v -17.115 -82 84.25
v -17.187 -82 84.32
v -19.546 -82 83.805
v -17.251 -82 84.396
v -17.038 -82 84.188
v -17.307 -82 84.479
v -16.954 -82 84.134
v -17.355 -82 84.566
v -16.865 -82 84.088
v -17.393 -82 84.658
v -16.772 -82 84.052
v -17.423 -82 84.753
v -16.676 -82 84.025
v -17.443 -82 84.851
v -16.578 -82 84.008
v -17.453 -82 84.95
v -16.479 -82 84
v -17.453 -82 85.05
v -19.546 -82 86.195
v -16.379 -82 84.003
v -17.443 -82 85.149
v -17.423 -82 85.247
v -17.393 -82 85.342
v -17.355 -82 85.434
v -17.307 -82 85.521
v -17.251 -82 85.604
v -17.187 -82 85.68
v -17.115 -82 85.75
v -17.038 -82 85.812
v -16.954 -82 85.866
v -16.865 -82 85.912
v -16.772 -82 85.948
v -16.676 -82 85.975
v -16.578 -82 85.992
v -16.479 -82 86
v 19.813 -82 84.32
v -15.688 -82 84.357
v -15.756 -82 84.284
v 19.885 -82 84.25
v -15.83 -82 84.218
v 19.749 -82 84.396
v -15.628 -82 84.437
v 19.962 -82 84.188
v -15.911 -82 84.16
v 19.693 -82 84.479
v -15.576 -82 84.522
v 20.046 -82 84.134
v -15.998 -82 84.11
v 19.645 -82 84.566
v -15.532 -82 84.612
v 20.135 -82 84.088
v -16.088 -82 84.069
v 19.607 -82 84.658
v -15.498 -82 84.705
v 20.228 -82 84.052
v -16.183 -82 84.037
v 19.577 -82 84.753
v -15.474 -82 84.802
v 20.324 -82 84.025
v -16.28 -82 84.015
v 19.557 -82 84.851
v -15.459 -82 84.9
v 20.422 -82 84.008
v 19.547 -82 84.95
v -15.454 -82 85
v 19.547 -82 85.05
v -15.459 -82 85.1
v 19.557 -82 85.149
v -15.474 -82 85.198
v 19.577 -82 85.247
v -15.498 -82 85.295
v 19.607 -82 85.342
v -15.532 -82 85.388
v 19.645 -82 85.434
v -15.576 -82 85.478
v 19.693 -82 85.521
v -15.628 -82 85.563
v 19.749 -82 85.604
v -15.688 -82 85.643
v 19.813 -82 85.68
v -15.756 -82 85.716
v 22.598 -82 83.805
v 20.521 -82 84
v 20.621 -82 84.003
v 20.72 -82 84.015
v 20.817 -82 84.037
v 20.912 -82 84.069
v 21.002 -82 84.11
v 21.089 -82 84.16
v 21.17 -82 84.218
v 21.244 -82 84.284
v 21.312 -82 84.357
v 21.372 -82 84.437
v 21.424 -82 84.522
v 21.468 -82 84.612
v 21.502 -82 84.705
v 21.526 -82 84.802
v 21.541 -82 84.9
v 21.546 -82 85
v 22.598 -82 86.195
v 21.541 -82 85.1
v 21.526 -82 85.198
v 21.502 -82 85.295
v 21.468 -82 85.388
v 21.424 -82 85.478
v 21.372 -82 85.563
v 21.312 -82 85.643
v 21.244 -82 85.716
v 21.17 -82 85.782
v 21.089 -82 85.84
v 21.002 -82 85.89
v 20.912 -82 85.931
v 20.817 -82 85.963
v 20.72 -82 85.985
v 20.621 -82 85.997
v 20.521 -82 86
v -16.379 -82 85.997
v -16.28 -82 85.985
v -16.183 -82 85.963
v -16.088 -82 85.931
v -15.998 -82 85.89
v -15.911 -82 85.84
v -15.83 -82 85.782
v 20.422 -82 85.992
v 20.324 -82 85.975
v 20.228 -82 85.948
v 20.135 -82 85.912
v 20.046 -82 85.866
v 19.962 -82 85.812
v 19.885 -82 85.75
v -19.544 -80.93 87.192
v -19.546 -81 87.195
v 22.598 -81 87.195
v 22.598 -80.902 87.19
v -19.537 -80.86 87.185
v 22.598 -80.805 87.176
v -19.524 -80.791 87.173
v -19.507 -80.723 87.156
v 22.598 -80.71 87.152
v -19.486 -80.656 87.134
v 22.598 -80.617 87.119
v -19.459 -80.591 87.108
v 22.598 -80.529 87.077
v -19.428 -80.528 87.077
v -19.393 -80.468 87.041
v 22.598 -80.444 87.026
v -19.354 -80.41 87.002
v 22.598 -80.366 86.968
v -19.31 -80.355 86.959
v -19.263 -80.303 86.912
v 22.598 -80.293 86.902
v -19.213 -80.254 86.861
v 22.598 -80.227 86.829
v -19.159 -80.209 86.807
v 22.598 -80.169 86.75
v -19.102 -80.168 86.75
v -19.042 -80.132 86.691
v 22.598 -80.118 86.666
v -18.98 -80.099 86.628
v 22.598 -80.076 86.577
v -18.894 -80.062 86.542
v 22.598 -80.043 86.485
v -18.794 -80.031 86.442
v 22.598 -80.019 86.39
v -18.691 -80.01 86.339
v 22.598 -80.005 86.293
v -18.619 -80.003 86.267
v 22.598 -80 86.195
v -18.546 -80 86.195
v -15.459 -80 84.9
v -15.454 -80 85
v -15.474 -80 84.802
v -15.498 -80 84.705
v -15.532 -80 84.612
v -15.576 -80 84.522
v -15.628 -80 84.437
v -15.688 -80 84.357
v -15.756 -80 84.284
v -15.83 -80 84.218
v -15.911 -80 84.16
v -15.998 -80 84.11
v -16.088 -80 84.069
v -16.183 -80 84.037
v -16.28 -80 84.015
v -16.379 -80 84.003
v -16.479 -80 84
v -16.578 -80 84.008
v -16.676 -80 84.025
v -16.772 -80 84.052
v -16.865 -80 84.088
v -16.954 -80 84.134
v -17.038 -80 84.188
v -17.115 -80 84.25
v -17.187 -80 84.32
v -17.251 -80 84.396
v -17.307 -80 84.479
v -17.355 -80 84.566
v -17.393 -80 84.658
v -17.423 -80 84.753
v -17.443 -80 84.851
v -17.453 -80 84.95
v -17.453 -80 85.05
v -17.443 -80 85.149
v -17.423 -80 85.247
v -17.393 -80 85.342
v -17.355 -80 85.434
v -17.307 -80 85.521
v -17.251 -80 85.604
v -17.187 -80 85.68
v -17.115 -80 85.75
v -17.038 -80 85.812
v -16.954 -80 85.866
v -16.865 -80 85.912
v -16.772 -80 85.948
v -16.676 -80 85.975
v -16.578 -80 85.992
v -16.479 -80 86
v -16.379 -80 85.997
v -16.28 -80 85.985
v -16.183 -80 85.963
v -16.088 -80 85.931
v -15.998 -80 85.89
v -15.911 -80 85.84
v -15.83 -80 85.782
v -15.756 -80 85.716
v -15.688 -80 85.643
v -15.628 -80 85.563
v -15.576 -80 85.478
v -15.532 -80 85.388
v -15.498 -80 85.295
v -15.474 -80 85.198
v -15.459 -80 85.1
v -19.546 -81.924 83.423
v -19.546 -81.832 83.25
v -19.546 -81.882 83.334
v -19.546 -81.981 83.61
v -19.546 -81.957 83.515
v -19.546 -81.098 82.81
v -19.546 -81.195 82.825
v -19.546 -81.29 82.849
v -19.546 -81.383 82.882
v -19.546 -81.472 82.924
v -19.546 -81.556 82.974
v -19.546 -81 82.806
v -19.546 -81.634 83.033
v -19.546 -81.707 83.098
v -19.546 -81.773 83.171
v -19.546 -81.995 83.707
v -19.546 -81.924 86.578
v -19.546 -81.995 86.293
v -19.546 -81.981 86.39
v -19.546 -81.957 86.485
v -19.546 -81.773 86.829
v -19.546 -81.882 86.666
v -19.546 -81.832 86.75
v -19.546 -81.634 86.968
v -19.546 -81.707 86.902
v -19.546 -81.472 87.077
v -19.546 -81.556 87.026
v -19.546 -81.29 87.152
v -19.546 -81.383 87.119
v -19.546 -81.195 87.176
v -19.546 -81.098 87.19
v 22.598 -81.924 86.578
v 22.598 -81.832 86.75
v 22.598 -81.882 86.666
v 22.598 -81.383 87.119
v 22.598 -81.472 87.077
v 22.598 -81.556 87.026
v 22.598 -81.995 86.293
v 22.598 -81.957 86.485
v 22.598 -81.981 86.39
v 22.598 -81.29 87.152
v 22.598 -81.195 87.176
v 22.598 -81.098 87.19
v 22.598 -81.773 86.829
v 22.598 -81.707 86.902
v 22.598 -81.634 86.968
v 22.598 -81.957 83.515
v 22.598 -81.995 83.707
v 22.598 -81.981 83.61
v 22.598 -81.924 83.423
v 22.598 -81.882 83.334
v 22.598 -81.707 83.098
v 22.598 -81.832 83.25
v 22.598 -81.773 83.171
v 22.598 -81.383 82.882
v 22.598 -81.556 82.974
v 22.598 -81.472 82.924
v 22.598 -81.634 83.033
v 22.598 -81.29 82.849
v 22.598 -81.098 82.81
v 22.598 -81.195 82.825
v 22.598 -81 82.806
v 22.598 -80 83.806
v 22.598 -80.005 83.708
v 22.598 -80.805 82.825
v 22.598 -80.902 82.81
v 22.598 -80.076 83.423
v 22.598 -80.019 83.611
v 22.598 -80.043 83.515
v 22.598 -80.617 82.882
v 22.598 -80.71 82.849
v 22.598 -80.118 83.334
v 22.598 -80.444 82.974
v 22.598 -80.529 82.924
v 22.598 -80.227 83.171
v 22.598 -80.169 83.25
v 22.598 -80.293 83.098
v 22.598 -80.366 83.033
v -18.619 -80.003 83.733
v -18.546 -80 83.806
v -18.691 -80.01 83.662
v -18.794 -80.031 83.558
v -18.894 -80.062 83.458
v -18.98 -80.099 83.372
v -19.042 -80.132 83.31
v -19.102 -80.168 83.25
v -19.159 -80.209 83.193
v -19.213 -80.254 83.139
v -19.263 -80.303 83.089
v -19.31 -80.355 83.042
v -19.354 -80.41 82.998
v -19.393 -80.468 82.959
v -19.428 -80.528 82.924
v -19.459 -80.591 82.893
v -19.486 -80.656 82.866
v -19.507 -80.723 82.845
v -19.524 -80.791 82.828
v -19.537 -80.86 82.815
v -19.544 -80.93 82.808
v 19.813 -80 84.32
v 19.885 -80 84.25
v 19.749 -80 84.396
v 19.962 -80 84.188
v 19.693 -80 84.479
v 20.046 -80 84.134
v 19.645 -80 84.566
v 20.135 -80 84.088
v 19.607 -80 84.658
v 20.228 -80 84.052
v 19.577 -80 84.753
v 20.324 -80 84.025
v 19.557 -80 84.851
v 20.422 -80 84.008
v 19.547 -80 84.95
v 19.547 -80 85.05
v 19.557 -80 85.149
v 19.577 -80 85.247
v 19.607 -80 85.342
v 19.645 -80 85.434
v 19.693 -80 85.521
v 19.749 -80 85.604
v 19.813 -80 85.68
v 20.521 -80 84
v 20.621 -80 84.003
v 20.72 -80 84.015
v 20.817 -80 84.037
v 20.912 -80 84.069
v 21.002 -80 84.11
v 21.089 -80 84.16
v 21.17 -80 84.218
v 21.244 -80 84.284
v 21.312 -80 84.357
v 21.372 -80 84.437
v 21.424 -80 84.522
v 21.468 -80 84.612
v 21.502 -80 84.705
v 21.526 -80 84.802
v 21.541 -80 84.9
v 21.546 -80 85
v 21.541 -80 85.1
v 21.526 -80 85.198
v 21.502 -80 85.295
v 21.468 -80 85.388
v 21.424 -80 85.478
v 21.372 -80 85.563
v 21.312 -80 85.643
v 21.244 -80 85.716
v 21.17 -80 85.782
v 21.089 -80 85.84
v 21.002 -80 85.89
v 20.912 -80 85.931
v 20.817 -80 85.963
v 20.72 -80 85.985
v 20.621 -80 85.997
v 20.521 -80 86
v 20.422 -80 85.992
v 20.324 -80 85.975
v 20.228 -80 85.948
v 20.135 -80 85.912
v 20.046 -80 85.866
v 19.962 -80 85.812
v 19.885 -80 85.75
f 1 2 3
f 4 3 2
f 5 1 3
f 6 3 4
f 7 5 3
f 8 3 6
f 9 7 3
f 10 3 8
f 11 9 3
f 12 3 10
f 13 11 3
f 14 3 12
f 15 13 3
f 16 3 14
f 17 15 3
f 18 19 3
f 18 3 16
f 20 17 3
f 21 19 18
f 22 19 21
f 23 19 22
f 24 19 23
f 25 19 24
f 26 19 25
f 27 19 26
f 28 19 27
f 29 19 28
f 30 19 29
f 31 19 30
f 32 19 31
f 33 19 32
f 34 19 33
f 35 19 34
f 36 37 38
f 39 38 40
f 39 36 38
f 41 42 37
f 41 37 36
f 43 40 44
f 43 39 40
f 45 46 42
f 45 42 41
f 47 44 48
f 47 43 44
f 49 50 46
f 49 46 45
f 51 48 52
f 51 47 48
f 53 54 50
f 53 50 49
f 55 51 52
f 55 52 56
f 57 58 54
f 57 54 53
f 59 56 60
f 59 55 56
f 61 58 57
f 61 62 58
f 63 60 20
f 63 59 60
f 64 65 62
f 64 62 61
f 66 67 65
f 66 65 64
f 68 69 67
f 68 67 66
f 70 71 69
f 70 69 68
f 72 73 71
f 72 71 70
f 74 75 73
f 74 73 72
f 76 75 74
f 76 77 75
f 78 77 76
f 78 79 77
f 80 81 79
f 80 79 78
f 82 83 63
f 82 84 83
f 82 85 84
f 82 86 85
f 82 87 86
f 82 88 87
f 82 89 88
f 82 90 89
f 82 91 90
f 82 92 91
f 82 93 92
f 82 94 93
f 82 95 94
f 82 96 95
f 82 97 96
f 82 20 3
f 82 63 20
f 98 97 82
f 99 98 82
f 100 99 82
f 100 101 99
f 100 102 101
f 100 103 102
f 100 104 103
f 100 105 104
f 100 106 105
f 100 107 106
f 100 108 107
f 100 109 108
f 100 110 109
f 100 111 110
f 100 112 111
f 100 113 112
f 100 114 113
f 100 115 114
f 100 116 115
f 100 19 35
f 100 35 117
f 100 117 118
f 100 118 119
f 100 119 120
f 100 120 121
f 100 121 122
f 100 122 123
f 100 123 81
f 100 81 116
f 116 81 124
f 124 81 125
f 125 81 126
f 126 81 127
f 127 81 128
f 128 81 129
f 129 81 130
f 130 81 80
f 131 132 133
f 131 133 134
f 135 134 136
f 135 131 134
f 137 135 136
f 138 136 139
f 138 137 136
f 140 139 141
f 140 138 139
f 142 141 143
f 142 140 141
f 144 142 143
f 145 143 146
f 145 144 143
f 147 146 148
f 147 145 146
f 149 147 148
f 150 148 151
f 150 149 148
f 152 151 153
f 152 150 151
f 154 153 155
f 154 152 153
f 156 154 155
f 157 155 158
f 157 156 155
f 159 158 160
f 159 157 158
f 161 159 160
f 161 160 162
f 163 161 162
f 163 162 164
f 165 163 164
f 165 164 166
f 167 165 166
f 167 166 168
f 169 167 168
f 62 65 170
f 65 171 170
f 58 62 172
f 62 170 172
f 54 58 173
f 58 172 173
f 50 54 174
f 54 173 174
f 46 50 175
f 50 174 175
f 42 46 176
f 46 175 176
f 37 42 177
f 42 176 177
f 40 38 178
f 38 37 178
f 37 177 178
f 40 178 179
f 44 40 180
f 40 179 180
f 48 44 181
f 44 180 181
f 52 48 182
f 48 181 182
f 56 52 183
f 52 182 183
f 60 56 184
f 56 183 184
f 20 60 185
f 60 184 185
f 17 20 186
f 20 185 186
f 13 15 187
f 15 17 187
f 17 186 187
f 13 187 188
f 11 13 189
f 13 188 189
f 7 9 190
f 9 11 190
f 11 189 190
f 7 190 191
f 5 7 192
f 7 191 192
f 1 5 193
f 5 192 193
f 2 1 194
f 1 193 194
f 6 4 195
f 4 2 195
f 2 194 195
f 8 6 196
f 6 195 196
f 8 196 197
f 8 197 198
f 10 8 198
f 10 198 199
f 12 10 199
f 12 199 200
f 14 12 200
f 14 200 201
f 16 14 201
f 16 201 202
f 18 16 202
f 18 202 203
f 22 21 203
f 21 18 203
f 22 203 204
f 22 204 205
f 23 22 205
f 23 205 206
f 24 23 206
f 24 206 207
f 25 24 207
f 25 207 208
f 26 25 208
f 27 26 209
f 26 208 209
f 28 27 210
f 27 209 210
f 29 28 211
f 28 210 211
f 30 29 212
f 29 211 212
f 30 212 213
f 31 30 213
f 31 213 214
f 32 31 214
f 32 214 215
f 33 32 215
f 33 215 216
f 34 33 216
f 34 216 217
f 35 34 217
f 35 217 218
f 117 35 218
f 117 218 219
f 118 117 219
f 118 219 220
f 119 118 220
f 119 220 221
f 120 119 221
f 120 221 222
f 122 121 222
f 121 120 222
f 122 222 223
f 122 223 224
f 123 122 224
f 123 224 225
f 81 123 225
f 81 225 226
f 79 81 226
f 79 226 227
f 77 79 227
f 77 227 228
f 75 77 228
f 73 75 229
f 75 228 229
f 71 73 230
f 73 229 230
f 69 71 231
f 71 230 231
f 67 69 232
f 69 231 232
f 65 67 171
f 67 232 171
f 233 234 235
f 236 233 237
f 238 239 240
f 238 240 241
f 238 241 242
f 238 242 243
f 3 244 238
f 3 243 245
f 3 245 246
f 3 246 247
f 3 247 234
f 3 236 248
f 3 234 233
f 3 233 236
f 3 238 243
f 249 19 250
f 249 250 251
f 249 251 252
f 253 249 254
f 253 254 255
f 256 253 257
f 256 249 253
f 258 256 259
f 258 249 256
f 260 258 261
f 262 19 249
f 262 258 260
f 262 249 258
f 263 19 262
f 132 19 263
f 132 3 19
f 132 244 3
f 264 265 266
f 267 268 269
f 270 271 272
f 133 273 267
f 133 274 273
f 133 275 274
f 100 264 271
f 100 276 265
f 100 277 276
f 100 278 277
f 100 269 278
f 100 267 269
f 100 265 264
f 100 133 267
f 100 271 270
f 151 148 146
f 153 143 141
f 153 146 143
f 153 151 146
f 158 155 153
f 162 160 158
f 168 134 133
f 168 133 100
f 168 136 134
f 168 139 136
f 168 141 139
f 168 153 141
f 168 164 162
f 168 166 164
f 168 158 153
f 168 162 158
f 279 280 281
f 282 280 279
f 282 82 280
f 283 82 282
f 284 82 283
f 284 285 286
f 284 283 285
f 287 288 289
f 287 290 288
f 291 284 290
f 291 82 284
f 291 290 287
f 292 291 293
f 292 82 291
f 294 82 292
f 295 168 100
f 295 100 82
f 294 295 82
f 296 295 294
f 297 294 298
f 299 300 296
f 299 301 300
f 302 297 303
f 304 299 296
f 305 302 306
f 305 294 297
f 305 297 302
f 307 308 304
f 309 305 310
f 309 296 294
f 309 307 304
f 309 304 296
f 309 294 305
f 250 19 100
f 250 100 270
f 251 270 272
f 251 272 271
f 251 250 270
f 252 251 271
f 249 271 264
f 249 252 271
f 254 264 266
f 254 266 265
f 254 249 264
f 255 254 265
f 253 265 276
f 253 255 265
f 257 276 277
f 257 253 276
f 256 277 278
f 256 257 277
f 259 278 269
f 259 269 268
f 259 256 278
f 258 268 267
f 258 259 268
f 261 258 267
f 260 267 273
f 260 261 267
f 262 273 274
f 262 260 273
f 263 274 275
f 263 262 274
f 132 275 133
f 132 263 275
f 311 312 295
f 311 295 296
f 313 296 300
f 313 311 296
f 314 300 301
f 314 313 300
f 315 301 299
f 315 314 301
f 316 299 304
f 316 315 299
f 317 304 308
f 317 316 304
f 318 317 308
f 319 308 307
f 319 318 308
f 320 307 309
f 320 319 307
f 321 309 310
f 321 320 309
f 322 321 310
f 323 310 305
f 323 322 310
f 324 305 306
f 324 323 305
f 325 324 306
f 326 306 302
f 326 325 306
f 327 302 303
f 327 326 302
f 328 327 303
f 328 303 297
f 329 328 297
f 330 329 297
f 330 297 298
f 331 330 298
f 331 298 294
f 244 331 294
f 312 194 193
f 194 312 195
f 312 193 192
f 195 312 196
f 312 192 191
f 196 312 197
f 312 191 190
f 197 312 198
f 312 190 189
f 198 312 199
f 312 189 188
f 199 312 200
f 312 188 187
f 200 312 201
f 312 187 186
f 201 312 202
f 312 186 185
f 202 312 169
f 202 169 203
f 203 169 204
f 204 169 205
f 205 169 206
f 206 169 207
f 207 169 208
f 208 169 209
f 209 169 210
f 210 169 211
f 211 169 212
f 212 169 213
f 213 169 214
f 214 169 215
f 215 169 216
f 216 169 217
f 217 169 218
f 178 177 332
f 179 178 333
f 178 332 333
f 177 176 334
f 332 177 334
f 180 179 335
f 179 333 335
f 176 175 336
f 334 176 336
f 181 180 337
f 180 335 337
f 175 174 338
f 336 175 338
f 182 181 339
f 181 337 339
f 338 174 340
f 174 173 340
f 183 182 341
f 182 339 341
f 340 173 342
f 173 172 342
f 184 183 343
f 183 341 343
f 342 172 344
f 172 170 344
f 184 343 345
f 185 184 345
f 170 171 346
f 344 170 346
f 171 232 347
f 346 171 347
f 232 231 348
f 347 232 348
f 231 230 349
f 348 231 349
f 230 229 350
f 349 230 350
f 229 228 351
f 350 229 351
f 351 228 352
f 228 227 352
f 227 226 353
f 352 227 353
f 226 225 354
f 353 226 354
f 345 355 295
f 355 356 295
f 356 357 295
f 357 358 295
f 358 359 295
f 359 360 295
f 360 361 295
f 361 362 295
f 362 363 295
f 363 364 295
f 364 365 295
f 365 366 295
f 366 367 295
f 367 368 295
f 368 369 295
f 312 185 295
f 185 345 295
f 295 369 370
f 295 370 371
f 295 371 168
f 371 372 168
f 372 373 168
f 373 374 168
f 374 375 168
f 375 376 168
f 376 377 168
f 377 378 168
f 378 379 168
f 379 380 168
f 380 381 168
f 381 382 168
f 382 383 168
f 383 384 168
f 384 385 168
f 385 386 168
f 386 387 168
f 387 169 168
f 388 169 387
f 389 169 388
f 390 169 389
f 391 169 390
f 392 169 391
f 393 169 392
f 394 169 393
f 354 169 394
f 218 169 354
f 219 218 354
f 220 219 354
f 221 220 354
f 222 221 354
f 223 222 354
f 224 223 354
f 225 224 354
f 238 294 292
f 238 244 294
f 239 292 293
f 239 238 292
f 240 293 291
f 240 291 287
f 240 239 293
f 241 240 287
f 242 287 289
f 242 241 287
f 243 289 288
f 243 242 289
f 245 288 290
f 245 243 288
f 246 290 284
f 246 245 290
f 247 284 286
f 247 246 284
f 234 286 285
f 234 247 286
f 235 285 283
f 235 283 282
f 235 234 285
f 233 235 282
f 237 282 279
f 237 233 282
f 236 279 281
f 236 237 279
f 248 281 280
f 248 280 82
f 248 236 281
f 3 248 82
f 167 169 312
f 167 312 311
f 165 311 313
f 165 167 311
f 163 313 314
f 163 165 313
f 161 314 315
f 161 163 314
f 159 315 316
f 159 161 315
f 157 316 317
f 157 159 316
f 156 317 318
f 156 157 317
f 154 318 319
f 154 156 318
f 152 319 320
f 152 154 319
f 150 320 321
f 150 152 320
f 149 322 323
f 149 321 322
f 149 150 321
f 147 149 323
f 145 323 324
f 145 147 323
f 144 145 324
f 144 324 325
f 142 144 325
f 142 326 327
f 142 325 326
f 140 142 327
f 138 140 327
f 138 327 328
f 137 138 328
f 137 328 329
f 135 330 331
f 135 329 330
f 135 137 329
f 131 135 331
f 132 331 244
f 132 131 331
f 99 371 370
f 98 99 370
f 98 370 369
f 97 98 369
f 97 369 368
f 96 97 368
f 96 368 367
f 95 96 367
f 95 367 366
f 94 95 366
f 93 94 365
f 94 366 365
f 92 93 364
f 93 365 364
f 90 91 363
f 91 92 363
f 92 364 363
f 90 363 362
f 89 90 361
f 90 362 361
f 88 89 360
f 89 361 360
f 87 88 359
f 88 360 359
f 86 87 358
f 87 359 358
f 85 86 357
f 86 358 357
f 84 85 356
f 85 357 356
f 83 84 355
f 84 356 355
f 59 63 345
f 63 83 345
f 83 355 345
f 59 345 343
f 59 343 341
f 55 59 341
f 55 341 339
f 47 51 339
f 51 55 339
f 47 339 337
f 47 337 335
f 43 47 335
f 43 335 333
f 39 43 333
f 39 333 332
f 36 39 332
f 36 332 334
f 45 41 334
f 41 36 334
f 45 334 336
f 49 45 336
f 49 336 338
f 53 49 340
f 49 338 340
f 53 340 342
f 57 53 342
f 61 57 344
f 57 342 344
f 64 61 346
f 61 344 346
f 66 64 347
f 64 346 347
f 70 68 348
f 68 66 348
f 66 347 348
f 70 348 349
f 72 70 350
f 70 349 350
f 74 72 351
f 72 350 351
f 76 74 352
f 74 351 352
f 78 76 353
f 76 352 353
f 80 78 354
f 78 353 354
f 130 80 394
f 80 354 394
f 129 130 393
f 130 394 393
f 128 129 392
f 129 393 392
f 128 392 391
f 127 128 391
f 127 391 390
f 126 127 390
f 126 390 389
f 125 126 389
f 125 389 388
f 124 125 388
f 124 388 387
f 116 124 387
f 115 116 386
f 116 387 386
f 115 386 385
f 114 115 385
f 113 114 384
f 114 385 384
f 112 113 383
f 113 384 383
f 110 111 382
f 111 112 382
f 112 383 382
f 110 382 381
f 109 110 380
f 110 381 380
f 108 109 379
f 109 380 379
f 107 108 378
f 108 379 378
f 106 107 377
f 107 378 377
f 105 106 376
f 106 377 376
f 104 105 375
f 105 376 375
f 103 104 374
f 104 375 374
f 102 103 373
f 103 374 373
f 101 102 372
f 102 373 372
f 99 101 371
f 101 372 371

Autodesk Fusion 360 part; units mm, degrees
sketch "Sketch1" plane through (1.7731, -80, 44.5975) normal (0, -1, 0) x (1, 0, 0)
  circle A0 centre (-18.2269, 40.4025) radius 1
  line L0 (-21.3196, -42.597) -> (-21.3196, 42.597)
  line L1 (93.2269, 42.5973) -> (-81.7731, 42.5973)
  circle A1 centre (18.7731, 40.4025) radius 1
  line L2 (21.3196, -42.597) -> (21.3196, 42.597)
  line L3 (-21.3196, 42.597) -> (20.8249, 42.597)
  line L4 (20.8249, 42.597) -> (20.8249, 38.2081)
  line L5 (20.8249, 38.2081) -> (-21.3196, 38.2081)
  line L6 (-21.3196, 38.2081) -> (-21.3196, 42.597)
  line L7 (-21.3196, 42.597) -> (20.8249, 38.2081) construction
  line L8 (20.8249, 42.597) -> (-21.3196, 38.2081) construction
  point P0 (-0.2473, 40.4025)
extrude "Extrude1" add sketch "Sketch1" along normal blind 2
fillet "Fillet1" radius 1 4 edges at (1.5258, -80, 87.1945) (-19.5465, -80, 85) (1.5258, -80, 82.8055) (22.598, -80, 85)
delete_face "DeleteFace1" 1 faces at (21.938, -80.0596, 84.5216)
fillet "Fillet2" radius 1 2 edges at (1.5258, -82, 87.1945) (1.5258, -82, 82.8055)
